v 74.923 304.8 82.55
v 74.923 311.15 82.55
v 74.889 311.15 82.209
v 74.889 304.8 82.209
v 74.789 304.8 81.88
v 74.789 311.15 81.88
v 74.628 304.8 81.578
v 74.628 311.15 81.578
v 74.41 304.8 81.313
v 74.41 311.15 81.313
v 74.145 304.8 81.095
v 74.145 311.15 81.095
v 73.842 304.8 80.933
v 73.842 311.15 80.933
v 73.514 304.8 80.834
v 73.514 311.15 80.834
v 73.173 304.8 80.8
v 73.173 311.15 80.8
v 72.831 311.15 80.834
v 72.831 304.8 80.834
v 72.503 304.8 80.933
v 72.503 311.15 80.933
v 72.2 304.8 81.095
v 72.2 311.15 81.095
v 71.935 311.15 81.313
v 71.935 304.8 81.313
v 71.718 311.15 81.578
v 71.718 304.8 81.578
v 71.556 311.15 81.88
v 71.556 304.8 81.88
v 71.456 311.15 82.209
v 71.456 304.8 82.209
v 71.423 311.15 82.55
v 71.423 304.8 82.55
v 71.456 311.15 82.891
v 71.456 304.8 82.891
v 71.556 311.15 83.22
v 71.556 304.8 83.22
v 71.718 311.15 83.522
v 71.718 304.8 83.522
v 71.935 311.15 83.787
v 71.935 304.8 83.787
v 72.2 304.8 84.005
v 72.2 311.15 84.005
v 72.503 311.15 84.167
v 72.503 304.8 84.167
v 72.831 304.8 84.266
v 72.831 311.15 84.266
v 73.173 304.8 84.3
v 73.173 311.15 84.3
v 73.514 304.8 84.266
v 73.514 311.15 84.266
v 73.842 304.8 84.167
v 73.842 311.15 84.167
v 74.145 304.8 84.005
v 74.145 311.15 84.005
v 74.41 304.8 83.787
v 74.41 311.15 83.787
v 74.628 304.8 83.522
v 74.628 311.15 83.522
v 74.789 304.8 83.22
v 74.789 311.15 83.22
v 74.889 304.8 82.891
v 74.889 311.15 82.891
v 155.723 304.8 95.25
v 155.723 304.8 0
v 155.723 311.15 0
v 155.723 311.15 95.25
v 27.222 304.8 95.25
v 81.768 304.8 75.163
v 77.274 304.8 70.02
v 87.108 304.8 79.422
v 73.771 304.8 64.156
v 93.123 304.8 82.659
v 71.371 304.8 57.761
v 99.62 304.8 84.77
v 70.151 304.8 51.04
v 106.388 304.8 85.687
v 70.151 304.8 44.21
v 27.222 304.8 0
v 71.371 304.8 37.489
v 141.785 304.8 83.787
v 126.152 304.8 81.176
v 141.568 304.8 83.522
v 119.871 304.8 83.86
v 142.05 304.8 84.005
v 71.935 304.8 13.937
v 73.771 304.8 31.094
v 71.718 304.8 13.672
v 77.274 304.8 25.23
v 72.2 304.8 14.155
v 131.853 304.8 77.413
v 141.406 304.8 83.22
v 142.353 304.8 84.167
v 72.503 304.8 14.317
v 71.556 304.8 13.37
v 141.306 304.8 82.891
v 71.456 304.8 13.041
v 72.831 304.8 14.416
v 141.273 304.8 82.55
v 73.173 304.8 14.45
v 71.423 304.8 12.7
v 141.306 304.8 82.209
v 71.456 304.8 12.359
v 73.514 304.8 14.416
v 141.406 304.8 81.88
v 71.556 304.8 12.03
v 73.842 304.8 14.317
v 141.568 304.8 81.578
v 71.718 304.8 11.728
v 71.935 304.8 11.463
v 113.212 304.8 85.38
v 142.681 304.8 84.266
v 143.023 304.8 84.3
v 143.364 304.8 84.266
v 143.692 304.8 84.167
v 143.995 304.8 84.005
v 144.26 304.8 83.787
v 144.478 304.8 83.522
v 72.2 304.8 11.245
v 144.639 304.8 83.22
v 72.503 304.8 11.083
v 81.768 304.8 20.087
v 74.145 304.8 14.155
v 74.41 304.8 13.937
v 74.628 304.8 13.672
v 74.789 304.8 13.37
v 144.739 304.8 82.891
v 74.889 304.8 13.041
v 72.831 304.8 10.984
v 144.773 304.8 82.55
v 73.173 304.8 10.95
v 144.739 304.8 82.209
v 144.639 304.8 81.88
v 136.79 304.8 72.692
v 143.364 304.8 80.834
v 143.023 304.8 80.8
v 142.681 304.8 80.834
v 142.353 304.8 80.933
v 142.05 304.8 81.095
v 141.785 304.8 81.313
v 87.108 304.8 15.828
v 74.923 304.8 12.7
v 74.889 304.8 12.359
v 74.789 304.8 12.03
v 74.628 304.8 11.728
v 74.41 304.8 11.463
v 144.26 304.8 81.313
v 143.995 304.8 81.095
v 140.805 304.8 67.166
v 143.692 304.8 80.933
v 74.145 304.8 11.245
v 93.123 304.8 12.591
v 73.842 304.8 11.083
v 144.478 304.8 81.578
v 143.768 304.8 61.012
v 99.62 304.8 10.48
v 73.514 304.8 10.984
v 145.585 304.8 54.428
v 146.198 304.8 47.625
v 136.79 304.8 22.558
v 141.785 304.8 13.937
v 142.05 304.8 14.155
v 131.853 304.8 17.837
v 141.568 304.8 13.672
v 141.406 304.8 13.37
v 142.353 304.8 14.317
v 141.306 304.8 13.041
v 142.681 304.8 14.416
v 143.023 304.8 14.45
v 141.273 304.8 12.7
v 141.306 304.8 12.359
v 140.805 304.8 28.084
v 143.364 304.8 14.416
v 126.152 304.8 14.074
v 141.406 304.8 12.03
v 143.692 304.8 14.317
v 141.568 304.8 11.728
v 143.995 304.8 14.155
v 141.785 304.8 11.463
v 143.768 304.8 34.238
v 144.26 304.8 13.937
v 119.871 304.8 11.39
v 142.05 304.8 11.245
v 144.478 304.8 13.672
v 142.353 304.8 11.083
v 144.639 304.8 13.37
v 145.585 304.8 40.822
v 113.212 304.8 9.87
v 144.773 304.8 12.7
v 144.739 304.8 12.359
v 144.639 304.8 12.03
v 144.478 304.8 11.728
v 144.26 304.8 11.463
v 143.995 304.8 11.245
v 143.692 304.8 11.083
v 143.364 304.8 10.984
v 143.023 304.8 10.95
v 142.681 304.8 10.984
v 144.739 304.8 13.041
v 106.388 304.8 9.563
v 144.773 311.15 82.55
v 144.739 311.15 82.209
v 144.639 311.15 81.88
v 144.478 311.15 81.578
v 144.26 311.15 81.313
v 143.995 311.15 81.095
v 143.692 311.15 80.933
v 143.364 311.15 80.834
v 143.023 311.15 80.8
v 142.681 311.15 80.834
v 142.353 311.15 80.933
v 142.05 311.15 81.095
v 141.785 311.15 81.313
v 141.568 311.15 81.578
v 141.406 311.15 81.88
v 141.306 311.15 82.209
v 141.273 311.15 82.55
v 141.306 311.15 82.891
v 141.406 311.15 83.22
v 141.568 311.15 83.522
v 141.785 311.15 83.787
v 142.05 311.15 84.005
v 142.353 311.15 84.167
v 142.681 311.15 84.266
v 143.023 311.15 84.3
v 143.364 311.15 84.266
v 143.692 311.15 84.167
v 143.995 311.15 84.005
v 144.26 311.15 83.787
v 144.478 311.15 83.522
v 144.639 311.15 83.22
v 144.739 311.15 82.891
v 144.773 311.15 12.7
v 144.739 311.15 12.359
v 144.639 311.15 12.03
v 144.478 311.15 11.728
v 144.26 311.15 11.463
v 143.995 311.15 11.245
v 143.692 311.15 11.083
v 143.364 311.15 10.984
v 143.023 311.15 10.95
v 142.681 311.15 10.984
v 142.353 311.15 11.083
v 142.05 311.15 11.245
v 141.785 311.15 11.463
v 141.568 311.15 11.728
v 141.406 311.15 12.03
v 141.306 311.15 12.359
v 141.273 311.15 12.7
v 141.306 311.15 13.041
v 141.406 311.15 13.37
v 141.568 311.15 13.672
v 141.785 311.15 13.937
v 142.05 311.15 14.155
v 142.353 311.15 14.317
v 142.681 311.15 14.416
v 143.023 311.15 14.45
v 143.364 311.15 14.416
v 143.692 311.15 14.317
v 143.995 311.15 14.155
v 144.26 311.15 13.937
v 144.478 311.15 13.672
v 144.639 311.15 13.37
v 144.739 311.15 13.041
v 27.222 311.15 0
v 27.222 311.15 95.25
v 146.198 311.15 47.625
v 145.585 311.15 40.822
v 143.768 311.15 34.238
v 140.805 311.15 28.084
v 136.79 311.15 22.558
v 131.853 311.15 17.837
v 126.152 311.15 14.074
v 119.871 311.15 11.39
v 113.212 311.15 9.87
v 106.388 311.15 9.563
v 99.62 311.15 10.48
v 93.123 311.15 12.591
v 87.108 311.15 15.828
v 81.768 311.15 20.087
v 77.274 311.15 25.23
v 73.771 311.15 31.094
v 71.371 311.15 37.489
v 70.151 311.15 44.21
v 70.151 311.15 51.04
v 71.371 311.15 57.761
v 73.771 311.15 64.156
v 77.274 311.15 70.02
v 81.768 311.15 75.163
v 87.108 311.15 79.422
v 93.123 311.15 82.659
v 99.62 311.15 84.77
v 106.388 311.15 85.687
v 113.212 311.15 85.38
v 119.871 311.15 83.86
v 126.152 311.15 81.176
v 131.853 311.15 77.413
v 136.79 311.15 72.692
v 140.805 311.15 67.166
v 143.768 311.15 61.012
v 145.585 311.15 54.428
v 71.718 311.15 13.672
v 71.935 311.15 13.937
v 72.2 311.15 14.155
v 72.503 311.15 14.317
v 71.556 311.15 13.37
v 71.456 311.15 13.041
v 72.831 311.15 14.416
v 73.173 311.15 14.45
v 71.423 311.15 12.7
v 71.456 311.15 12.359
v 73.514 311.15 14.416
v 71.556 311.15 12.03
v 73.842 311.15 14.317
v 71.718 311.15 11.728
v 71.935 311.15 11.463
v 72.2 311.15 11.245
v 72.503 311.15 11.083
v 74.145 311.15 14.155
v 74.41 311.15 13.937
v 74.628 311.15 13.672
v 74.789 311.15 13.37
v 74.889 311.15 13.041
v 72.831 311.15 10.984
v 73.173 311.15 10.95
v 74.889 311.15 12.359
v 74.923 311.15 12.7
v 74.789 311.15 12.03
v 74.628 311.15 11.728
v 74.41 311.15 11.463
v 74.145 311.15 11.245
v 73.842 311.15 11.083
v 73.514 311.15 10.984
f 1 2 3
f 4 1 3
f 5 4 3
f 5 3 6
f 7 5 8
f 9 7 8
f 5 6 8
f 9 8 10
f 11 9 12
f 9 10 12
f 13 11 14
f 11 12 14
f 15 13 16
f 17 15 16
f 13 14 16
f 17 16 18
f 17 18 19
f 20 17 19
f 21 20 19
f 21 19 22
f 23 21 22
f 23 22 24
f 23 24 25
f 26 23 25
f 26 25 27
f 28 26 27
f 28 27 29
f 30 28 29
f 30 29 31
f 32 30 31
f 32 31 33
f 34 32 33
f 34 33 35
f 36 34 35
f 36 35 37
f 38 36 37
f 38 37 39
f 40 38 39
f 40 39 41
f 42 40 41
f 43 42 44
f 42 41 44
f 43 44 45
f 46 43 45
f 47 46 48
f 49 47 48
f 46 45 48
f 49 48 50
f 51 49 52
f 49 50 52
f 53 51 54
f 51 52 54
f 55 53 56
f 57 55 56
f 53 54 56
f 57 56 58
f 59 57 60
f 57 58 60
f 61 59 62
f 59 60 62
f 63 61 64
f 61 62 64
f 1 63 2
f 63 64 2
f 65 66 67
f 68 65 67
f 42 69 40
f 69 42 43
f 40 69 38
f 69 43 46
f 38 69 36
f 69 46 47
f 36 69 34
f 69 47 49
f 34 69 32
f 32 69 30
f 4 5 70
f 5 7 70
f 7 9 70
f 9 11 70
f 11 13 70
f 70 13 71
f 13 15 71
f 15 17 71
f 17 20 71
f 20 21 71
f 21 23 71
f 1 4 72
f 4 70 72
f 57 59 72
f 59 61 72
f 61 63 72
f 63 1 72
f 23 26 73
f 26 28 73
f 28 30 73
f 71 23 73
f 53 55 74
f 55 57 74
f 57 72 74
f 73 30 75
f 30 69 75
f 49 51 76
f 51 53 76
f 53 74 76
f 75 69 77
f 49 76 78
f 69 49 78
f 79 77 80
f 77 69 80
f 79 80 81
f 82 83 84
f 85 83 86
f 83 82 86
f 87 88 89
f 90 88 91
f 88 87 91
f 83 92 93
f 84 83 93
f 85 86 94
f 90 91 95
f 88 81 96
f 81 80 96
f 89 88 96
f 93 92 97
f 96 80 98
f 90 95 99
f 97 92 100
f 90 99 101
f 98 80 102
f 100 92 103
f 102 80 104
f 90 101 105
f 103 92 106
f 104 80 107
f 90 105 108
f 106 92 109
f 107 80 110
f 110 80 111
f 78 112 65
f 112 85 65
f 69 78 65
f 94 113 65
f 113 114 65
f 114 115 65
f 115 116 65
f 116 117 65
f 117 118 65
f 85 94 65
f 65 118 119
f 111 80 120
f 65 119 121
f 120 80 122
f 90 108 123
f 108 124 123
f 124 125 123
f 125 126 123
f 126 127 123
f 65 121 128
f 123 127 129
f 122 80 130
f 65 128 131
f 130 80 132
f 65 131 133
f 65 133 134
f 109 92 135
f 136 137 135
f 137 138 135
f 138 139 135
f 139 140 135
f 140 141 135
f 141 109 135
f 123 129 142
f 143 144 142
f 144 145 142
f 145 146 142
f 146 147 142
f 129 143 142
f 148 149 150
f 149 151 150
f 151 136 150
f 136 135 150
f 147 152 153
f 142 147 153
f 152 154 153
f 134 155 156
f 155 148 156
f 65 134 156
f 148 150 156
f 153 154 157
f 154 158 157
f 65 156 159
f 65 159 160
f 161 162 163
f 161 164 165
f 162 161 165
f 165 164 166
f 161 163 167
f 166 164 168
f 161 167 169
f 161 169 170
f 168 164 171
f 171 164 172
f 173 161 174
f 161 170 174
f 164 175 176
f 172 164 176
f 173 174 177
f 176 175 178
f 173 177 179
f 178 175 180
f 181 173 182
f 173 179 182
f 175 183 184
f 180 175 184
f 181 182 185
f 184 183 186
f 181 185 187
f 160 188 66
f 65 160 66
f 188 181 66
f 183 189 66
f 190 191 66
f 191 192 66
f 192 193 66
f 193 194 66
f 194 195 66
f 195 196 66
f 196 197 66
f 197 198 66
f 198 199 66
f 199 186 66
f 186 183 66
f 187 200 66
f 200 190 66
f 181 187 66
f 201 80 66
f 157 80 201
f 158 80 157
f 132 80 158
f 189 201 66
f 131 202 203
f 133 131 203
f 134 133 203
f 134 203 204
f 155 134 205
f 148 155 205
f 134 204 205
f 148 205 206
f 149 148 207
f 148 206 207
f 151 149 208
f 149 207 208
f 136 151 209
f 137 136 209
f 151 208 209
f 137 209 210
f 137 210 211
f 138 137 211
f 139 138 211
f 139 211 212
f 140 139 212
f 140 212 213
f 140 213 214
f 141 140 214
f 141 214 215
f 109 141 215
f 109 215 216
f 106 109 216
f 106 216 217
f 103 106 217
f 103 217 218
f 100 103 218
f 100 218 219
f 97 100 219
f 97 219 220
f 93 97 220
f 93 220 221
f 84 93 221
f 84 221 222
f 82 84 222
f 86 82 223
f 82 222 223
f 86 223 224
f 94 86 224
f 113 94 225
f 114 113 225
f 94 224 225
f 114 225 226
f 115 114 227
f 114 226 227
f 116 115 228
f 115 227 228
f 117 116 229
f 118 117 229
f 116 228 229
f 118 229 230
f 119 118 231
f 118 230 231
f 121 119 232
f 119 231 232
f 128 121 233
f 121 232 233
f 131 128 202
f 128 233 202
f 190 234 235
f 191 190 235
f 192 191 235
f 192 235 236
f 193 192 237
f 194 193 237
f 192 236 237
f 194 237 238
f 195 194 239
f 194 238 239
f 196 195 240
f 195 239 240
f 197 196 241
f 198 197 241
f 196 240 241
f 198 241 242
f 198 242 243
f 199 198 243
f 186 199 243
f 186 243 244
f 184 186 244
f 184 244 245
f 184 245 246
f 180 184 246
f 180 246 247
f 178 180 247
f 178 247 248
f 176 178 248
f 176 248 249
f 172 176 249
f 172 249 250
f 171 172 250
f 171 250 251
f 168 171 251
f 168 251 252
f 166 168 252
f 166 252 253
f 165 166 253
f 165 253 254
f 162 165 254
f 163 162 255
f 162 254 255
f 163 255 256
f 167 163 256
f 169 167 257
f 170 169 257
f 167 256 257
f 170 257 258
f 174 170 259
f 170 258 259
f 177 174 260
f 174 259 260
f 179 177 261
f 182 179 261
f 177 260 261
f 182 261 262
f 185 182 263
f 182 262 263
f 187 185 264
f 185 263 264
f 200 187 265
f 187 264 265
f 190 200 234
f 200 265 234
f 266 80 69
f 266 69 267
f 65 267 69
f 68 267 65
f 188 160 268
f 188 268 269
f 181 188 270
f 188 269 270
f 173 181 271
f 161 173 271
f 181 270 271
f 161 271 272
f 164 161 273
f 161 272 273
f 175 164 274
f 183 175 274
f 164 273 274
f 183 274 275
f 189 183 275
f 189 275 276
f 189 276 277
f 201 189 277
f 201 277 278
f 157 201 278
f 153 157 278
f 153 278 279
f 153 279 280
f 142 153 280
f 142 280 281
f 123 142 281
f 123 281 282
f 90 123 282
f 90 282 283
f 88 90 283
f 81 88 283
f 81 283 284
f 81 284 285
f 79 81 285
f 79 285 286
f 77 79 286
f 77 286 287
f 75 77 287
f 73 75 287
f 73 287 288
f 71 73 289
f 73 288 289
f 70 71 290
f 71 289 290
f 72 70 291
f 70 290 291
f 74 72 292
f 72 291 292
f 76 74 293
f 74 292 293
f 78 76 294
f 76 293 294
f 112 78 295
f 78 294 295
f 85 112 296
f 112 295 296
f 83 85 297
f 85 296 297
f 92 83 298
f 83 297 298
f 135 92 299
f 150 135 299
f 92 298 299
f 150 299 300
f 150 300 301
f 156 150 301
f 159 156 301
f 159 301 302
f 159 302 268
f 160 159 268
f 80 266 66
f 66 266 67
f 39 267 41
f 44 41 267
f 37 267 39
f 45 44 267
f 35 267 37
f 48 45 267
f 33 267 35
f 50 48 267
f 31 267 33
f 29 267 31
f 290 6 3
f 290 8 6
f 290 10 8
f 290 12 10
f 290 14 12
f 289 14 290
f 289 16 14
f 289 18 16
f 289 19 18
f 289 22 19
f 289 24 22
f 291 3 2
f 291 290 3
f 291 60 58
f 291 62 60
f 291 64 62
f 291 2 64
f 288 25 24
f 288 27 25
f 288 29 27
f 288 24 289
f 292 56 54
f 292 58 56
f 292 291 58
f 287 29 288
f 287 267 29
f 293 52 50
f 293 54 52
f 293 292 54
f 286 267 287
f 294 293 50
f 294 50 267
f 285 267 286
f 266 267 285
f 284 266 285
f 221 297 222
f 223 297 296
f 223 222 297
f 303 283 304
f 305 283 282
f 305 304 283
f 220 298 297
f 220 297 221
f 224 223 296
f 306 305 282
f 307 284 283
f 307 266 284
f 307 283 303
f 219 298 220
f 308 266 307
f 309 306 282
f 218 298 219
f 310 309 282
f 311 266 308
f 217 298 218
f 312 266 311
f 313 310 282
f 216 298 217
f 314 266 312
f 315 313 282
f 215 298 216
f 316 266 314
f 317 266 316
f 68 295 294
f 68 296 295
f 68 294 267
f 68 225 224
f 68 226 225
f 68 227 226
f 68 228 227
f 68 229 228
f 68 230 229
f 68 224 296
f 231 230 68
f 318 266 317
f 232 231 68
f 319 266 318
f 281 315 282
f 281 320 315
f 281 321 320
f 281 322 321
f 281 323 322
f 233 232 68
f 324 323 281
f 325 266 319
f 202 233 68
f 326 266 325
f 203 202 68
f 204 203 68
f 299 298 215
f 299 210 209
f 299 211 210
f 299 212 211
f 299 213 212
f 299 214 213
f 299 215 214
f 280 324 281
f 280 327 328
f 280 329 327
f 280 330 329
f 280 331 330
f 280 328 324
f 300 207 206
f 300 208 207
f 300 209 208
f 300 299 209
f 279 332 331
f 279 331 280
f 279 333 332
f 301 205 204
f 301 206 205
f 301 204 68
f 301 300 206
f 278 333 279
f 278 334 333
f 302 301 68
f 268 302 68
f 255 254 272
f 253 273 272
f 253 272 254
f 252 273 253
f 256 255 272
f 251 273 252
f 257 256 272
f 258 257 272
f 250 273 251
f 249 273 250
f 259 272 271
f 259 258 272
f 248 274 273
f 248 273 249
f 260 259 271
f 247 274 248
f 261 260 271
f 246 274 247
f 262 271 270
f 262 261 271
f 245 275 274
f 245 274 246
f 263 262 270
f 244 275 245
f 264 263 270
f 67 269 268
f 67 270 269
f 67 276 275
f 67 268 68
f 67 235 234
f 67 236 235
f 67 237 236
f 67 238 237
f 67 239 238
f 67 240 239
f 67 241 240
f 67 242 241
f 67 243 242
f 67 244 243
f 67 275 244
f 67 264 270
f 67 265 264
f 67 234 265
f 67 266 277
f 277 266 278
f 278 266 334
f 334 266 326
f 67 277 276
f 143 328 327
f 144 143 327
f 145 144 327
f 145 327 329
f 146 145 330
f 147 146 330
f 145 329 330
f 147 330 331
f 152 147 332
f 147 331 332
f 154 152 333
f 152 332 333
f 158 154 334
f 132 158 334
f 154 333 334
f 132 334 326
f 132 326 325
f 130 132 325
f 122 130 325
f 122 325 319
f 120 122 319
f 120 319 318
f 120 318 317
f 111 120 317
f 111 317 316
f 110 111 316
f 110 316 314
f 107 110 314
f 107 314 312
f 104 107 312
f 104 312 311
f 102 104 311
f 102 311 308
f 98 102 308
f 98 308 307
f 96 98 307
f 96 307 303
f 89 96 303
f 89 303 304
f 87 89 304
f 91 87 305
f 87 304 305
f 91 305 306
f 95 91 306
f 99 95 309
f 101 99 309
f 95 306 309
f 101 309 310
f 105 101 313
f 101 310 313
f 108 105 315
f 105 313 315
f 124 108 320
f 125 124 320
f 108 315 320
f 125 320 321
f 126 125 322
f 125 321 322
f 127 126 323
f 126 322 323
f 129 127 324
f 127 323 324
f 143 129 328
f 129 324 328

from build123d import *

# Parameters (mm, degrees)
SKETCH5_W           = 128.500510093
SKETCH5_H           = 6.35
BOSS_EXTRUDE1_DEPTH = 95.25
SKETCH6_R           = 38.1
SKETCH6_R_2         = 1.75
CUT_EXTRUDE3_DEPTH  = 7.35


with BuildPart() as part:
    # Sketch5 → Boss-Extrude1 (new body)
    with BuildSketch(Plane.XY):
        with Locations((91.472352703, 307.975)):
            Rectangle(SKETCH5_W, SKETCH5_H)
    extrude(amount=BOSS_EXTRUDE1_DEPTH)

    # Sketch6 → Cut-Extrude3 (cut, through all)
    with BuildSketch(Plane(origin=(0, 311.15, 0), x_dir=(1, 0, 0), z_dir=(0, 1, 0))):
        with Locations((108.097607749, -47.625)):
            Circle(SKETCH6_R)
        with Locations((73.172607749, -12.7)):
            Circle(SKETCH6_R_2)
        with Locations((73.172607749, -82.55)):
            Circle(SKETCH6_R_2)
        with Locations((143.022607749, -82.55)):
            Circle(SKETCH6_R_2)
        with Locations((143.022607749, -12.7)):
            Circle(SKETCH6_R_2)
    extrude(amount=-CUT_EXTRUDE3_DEPTH, mode=Mode.SUBTRACT)


solid = part.part
